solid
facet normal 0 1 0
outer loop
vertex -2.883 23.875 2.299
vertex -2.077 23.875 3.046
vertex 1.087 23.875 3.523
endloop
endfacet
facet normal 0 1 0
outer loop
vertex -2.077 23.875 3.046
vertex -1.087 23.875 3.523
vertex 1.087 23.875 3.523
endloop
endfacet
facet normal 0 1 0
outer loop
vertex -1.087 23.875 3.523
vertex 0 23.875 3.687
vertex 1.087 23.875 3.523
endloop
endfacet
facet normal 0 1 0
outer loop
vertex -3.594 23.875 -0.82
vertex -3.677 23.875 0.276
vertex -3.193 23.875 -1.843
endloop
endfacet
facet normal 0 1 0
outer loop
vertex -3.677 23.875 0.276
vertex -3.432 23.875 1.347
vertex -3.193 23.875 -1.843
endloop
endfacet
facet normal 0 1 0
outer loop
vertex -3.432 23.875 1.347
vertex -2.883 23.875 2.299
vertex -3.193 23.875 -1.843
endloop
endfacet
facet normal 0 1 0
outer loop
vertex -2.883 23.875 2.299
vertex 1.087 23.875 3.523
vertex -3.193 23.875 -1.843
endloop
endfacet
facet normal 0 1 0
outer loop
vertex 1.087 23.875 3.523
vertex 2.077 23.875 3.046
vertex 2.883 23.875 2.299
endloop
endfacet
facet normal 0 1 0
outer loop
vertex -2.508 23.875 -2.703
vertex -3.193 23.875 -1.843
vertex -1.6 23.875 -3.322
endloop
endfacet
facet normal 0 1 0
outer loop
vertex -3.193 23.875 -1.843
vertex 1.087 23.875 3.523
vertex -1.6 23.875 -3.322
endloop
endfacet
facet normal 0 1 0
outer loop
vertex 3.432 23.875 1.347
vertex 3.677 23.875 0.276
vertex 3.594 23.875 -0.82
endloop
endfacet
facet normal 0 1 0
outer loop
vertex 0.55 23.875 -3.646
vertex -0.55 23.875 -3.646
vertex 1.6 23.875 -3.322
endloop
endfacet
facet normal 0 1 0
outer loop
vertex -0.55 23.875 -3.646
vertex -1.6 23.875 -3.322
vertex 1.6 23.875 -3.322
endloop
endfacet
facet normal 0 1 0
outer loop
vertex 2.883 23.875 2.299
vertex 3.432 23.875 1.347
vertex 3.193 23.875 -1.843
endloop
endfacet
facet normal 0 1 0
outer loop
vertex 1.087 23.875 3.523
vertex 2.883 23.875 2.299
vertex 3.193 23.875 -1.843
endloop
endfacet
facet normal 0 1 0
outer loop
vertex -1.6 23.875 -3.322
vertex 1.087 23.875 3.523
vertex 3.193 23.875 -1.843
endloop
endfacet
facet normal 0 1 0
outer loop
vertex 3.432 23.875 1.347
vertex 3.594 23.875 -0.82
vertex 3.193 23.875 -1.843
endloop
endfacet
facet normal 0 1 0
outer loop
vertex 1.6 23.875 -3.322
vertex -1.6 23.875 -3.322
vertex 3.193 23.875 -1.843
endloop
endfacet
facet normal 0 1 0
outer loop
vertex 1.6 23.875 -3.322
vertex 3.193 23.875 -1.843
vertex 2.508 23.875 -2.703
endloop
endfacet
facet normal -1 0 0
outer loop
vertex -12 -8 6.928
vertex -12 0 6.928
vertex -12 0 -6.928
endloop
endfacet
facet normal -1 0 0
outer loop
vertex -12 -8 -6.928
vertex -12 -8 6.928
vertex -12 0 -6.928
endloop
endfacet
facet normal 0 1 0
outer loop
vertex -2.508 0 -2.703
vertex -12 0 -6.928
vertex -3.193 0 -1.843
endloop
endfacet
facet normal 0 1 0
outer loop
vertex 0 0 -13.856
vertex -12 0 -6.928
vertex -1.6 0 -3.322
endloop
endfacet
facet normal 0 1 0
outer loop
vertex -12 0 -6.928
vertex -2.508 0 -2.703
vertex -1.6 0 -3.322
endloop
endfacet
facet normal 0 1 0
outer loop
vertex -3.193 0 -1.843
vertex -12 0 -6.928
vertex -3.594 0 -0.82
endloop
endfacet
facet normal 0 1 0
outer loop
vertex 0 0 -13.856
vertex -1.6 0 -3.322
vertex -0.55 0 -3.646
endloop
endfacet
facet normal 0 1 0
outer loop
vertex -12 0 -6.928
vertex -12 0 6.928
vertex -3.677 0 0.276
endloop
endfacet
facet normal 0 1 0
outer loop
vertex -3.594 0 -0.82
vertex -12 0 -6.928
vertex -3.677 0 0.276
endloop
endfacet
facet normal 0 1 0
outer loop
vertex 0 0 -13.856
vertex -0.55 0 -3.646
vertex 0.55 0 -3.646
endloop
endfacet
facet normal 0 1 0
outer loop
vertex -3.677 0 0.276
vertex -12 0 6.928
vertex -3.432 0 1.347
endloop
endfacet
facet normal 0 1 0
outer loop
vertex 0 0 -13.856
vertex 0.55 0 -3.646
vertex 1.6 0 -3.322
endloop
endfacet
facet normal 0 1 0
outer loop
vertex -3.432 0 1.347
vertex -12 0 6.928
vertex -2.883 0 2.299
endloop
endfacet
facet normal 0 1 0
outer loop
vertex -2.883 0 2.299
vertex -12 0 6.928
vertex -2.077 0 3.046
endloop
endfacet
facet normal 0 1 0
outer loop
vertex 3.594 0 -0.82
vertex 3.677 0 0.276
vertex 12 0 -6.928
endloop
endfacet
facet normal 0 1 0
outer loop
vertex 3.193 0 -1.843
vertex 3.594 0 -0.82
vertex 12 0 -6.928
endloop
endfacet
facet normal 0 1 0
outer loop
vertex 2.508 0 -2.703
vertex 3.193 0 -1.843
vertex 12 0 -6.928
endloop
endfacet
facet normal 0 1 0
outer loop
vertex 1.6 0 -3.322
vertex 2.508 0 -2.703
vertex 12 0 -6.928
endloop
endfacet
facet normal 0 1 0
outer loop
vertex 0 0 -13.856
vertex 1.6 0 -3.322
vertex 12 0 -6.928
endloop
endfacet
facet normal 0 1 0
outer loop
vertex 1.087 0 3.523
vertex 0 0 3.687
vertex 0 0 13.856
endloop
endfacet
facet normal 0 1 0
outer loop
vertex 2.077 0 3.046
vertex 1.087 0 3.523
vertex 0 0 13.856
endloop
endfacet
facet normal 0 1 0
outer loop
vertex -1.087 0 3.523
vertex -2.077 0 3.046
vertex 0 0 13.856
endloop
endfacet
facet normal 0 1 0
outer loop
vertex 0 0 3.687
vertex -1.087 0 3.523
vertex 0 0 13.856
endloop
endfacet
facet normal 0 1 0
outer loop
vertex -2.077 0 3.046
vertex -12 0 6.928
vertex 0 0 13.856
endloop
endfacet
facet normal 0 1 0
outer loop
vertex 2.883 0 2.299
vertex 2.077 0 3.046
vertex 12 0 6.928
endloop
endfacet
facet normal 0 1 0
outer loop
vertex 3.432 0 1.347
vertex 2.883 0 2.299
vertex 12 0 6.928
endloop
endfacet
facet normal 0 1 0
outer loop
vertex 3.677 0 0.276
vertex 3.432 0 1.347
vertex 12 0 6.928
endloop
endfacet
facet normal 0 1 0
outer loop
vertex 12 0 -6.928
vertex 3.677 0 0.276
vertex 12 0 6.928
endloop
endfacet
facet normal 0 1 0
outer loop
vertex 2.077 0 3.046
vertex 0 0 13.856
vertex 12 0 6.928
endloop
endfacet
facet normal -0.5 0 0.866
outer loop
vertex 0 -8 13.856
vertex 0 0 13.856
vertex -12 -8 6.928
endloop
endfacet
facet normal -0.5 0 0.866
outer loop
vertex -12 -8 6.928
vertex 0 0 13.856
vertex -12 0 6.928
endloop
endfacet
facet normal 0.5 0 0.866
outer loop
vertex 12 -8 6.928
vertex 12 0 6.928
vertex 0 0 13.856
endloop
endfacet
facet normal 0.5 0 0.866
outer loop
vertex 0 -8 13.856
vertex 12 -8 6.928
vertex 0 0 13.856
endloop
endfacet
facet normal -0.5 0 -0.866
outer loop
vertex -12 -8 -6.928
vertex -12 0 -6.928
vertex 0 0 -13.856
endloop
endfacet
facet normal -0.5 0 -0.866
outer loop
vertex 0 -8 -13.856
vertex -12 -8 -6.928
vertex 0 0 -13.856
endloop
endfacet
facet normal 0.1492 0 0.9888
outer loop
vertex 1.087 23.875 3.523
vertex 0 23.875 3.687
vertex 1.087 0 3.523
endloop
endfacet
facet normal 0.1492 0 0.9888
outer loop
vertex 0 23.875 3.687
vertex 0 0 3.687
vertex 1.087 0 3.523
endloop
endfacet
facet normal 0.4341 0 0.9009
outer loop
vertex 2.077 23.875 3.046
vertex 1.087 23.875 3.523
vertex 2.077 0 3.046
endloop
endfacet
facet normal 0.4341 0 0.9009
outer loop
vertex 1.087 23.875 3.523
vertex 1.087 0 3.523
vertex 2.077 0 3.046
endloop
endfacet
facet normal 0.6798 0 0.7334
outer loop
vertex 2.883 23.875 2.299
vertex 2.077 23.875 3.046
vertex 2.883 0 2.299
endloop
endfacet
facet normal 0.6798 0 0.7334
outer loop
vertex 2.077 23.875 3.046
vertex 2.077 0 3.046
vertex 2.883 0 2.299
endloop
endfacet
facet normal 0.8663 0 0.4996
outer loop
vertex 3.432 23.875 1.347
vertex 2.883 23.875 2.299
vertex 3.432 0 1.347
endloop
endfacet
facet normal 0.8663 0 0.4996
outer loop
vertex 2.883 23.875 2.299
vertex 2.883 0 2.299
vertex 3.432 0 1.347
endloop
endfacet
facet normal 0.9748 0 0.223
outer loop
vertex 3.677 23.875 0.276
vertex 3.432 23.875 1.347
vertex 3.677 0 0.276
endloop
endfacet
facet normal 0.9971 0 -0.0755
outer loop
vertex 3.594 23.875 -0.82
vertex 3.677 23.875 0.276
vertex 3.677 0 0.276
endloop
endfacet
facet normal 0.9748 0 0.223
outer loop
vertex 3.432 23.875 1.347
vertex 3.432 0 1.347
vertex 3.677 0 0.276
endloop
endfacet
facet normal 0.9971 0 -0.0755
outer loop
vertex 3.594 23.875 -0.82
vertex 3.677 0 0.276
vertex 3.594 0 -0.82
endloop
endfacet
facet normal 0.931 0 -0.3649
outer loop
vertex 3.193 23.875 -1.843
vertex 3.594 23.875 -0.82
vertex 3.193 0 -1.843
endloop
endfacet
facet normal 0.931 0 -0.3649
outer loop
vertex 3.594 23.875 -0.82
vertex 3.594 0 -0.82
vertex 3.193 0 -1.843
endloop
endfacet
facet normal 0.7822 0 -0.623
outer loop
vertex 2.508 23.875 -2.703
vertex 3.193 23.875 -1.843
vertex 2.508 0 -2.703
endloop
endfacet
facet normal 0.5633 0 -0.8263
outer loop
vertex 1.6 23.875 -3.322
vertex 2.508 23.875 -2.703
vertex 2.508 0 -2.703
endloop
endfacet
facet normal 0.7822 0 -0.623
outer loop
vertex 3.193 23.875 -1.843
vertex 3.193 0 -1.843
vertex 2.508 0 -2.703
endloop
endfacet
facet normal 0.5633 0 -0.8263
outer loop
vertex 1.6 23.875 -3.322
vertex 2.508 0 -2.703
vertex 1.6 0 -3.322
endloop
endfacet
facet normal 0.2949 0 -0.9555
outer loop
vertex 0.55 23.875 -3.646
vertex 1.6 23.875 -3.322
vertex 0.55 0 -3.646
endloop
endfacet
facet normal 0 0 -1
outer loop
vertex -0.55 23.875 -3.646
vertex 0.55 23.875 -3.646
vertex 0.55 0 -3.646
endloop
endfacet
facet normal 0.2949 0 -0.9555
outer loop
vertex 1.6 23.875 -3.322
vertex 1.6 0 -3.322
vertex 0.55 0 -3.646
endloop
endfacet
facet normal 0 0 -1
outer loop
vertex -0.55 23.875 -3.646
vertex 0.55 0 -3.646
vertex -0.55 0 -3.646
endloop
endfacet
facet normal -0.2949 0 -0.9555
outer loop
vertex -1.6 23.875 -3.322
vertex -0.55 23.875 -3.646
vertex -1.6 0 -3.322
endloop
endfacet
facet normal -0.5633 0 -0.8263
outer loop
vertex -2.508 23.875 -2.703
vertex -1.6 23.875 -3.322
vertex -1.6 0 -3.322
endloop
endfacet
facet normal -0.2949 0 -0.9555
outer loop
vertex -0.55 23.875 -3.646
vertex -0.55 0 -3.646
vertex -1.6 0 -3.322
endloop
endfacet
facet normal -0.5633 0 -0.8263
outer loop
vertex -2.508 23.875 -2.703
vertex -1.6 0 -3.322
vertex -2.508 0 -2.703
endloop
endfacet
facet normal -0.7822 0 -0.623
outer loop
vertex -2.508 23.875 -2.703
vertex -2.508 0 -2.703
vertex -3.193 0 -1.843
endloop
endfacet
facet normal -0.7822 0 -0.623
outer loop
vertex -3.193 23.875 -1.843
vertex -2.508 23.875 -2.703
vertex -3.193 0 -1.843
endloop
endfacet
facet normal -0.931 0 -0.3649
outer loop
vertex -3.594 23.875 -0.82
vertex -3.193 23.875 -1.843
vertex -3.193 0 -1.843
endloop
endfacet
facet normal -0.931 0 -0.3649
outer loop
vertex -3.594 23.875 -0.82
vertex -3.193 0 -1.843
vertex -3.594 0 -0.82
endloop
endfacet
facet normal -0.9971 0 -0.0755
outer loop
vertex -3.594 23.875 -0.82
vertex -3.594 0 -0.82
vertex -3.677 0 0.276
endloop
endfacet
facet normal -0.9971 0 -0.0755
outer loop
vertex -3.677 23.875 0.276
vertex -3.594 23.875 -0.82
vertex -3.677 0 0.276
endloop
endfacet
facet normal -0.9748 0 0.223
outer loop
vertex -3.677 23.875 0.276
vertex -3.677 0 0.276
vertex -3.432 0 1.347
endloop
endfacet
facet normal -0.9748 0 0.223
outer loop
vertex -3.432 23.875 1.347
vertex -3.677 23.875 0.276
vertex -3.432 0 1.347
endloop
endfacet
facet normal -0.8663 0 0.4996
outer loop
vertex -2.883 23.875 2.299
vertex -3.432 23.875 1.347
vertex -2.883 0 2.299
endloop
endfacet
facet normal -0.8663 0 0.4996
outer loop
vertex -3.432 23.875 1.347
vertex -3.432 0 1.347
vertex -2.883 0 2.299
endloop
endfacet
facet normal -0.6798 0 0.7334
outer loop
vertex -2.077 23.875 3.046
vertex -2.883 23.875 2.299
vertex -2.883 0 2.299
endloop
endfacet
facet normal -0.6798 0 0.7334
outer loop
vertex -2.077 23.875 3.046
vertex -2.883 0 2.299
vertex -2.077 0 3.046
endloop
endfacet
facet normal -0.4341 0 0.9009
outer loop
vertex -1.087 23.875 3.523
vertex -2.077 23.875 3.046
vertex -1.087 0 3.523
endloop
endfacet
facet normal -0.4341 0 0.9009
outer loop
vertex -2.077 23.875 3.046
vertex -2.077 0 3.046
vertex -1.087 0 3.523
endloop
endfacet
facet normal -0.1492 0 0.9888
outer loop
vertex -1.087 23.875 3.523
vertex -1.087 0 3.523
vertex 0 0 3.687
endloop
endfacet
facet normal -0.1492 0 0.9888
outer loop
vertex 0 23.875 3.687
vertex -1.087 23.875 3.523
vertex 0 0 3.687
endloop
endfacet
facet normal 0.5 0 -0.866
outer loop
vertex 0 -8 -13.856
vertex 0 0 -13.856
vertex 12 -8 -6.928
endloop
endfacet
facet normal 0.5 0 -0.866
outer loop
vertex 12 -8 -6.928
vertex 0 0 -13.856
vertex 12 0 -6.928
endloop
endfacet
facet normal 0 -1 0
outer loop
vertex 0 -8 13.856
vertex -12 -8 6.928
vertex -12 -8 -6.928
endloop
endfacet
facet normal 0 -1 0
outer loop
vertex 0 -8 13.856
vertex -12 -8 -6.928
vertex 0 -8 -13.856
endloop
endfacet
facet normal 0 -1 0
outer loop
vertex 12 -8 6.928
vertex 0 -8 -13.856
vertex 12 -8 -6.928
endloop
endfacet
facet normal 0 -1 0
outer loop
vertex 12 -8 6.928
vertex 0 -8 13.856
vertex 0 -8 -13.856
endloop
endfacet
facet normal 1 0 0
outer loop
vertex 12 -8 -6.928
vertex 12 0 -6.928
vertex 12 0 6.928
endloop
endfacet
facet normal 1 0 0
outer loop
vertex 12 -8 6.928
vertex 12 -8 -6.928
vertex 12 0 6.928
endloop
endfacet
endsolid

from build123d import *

# Parameters (mm, degrees)
F1_DEPTH = 8


with BuildPart() as f1:
    # F0 (on Front) → F1 (new body)
    with BuildSketch(Plane.XZ):
        Polygon((-12, 6.928203), (-12, -6.928203), (0, -13.856406), (12, -6.928203), (12, 6.928203), (0, 13.856406), align=None)
    extrude(amount=F1_DEPTH)

    # F2 (on Right) → F3 (revolve)
    with BuildSketch(Plane.YZ):
        Polygon((1.602202, 3.686891), (0, 3.686891), (0, 0), (23.874549, 0), (23.874549, 3.686891), align=None)
    revolve(axis=Axis((0, 11.937275, 0), (0, 1, 0)))


solid = f1.part
